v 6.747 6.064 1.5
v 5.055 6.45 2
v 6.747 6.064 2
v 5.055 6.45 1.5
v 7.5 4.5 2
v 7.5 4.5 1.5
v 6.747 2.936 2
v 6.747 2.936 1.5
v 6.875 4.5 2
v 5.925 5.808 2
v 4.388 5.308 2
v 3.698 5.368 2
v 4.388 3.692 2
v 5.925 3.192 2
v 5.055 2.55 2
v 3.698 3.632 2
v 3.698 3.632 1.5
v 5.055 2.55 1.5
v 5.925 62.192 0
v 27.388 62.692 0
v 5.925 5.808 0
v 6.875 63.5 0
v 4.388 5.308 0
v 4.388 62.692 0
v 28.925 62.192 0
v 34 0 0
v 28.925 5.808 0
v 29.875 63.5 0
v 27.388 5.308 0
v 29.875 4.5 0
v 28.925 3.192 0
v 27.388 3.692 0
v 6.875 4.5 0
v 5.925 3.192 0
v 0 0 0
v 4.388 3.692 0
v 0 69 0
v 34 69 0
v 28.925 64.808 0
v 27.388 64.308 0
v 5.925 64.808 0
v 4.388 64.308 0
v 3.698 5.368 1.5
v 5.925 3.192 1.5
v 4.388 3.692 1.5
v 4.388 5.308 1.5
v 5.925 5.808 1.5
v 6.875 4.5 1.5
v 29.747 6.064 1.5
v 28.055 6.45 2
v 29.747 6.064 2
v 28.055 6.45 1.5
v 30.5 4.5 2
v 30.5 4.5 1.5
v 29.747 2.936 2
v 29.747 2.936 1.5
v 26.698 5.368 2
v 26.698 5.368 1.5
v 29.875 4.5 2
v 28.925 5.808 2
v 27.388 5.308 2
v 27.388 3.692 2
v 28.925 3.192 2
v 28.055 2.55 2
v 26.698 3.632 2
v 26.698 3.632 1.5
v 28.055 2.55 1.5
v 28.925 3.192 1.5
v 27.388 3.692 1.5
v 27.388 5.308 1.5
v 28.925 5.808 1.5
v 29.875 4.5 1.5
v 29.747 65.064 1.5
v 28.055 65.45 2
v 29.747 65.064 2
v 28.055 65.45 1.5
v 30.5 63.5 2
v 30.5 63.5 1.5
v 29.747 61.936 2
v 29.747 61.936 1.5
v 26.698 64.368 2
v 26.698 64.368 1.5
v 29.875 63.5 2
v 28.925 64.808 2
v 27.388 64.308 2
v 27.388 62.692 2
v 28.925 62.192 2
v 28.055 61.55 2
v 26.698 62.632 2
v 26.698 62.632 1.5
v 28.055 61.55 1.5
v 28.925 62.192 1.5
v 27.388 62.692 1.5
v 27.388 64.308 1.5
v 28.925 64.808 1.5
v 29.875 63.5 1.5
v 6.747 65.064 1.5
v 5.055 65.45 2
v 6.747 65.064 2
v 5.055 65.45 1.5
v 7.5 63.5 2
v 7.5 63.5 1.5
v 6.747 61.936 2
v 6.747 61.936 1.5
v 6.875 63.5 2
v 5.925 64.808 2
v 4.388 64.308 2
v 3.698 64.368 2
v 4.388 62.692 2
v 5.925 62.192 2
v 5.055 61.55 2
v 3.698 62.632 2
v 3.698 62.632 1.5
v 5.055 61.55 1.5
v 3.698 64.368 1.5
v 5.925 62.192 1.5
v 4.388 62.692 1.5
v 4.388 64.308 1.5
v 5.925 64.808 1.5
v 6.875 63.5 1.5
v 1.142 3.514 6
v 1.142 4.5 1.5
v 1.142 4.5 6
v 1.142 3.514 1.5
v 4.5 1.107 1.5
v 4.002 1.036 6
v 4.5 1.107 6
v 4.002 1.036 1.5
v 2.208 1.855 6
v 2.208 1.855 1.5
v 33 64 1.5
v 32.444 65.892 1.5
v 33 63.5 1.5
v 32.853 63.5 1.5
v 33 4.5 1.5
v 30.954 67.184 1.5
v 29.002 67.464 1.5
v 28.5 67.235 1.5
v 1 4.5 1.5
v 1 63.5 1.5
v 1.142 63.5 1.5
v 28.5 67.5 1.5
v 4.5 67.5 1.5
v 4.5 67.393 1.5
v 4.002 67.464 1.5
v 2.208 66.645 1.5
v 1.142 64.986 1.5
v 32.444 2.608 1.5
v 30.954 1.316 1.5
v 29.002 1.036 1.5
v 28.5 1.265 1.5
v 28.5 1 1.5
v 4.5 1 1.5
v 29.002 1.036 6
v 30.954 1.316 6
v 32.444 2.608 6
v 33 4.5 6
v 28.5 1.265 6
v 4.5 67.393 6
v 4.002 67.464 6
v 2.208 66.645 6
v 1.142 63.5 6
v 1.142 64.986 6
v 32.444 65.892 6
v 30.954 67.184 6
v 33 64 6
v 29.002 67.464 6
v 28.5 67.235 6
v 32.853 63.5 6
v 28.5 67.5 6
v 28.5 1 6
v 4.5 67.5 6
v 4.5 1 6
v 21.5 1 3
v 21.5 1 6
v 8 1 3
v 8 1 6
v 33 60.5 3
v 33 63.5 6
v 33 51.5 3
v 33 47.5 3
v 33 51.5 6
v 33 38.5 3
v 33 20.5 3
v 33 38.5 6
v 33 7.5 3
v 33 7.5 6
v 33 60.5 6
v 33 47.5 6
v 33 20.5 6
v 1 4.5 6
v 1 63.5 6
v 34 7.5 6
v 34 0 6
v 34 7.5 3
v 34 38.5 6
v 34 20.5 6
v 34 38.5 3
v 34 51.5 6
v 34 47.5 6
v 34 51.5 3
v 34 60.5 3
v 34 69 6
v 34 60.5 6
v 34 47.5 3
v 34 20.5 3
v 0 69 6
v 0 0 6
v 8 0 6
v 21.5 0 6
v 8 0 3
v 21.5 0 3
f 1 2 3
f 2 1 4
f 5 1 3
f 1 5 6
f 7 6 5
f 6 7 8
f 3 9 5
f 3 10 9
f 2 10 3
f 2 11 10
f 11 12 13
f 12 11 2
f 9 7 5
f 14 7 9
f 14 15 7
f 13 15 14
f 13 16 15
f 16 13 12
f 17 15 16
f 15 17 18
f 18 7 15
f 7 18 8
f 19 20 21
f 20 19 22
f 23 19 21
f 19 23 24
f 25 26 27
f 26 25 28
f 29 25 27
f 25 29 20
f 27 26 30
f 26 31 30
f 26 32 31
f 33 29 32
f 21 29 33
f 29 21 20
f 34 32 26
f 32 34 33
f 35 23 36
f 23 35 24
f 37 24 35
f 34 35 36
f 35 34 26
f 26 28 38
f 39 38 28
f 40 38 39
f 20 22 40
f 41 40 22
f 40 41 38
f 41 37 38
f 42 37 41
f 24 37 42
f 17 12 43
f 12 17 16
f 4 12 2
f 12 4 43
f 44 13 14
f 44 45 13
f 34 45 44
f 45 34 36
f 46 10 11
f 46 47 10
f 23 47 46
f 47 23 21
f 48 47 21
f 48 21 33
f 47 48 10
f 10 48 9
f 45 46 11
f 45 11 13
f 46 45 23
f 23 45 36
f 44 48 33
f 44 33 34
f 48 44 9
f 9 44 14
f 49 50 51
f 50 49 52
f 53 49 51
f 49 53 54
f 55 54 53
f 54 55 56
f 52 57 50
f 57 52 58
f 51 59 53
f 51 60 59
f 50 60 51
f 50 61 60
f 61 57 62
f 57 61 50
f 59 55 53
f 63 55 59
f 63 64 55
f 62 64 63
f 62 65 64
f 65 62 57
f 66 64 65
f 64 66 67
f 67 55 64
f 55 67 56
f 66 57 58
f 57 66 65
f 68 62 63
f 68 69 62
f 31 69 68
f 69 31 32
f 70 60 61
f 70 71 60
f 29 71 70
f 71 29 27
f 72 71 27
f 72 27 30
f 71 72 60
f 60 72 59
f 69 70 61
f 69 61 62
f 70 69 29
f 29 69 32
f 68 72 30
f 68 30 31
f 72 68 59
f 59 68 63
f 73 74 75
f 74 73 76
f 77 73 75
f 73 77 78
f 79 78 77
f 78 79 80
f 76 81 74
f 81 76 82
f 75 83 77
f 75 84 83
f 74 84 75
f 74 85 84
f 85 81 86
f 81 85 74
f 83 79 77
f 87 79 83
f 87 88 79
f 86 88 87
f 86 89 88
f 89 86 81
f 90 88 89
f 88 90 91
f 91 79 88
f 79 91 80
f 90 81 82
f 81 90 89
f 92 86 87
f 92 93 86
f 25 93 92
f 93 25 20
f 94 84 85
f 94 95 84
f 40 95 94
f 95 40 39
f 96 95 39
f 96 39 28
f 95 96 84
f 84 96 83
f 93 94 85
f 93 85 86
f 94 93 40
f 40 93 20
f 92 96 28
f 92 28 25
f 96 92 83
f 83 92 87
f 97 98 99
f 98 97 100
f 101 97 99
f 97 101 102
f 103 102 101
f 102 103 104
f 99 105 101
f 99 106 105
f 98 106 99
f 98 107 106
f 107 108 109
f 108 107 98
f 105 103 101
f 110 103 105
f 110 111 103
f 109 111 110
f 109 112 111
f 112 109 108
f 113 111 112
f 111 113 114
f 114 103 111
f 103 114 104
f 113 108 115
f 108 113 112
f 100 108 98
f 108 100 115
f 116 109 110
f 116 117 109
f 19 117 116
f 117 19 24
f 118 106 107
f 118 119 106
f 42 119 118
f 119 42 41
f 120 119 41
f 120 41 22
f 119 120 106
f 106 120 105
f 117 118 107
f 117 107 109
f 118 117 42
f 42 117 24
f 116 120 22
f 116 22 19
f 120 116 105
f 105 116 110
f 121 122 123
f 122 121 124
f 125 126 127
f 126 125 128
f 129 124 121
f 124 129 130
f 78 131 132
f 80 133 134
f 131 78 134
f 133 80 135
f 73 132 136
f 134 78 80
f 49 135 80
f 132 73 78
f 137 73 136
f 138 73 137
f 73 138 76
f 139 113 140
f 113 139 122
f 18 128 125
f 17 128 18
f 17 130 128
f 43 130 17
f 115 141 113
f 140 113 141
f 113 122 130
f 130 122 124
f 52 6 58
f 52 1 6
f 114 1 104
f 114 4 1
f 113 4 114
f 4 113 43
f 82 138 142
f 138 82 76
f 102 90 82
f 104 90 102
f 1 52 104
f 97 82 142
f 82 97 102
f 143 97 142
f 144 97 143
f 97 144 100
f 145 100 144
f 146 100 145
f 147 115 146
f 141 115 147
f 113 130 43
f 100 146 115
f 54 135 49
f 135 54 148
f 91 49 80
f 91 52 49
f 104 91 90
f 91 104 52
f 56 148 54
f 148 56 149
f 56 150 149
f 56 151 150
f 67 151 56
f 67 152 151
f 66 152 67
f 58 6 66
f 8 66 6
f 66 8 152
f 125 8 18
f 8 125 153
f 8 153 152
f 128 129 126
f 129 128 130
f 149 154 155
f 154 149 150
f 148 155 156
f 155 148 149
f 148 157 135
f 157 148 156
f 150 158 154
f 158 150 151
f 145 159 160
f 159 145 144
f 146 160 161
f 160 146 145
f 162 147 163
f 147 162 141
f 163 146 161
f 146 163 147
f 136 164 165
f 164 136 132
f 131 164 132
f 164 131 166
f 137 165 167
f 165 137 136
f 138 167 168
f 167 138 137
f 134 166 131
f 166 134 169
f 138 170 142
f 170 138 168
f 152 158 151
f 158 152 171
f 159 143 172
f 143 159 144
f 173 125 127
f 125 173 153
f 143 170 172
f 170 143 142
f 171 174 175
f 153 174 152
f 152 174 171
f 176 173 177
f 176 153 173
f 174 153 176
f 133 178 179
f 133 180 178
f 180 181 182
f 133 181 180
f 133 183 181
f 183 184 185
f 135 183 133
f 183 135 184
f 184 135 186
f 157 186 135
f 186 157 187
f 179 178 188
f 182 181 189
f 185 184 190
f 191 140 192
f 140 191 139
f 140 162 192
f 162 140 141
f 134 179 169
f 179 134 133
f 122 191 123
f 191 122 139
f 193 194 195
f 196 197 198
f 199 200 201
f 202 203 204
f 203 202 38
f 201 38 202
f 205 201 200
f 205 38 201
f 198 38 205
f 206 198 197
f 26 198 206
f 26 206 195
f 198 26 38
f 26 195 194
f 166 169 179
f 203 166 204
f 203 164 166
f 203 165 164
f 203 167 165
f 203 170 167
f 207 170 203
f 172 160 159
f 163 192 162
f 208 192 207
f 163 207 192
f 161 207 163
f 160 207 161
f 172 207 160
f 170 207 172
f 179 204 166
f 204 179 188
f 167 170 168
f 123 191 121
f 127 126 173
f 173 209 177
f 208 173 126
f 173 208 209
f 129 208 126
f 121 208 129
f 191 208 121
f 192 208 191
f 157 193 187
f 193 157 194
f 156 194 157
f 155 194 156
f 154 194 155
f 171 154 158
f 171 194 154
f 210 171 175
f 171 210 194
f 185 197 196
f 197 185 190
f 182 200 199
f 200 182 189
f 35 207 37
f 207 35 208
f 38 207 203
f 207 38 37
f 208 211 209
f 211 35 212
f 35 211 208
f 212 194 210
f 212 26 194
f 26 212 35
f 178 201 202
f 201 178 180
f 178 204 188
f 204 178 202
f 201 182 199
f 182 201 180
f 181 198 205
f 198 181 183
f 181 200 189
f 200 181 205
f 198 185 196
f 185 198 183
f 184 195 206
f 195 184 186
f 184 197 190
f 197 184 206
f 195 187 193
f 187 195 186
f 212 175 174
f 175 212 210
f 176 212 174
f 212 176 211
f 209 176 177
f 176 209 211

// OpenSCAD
cornerRad = 3.5;
baseThickness = 1;
usbWidth = 9;
powerCenter = 55;
usbCenter = 42;
// Printed with green PLA at 210C 1.03 x 1.025 x 1.025 scaling
hdmiCenter = 13;
hdmiWidth = 13;
sdWidth = 13.5;
sdCenter = 16.75;
slotHeight = 3;
union() {
    difference() {
        translate([5.5,4.5,0]) cylinder(2,2,2); // Lower left
        translate([5.5,4.5,0]) screwhole();
    }
    difference() {
        translate([28.5,4.5,0]) cylinder(2,2,2); // Lower right
        translate([28.5,4.5,0]) screwhole(); // Lower right
    }
    difference() {
        translate([28.5,63.5,0]) cylinder(2,2,2); // Upper right
        translate([28.5,63.5,0]) screwhole(); // Upper right
    }
    difference() {
        translate([5.5,63.5,0]) cylinder(2,2,2); // Upper left    
        translate([5.5,63.5,0]) screwhole(); // Upper left
    }
    difference() {
        difference() {
            cube([34,69,6]);
            translate([1,1,1.5]) rpiOutline(8);
        }
        translate([5.5,4.5,0]) screwhole(); // Lower left
        translate([28.5,4.5,0]) screwhole(); // Lower right
        translate([28.5,63.5,0]) screwhole(); // Upper right
        translate([5.5,63.5,0]) screwhole(); // Upper left
        translate([0,1,0]) {
            translate([30,powerCenter-(usbWidth/2),slotHeight]) cube([4,usbWidth,3]);
            translate([30,usbCenter-(usbWidth/2),slotHeight]) cube([4,usbWidth,3]);
            translate([30,hdmiCenter-(hdmiWidth/2),slotHeight]) cube([4,hdmiWidth,3]);    
        }
        translate([1,0,0]) {
            translate([7,0,slotHeight]) cube([sdWidth,2,3]); // SD Slot
        }
    }
    
}

module rpiOutline(thick) {
    union() {
        translate([3.5,3.5,0]) corner(thick); // Lower Left
        translate([28.5,3.5,0]) corner(thick); // Lower Right
        translate([3.5,63,0]) corner(thick); //Upper Left
        translate([28.5,63,0]) corner(thick); // Upper Right
        translate([3.5,0,0]) cube([24,66.5,thick]); // Top and Bottom
        translate([0,3.5,0]) cube([32,59,thick]); // Sides
    }
}

module screwhole () {
        cylinder(6,1.375,1.375);
}
module corner (thick) {
    cylinder(thick,cornerRad,cornerRad);
}
